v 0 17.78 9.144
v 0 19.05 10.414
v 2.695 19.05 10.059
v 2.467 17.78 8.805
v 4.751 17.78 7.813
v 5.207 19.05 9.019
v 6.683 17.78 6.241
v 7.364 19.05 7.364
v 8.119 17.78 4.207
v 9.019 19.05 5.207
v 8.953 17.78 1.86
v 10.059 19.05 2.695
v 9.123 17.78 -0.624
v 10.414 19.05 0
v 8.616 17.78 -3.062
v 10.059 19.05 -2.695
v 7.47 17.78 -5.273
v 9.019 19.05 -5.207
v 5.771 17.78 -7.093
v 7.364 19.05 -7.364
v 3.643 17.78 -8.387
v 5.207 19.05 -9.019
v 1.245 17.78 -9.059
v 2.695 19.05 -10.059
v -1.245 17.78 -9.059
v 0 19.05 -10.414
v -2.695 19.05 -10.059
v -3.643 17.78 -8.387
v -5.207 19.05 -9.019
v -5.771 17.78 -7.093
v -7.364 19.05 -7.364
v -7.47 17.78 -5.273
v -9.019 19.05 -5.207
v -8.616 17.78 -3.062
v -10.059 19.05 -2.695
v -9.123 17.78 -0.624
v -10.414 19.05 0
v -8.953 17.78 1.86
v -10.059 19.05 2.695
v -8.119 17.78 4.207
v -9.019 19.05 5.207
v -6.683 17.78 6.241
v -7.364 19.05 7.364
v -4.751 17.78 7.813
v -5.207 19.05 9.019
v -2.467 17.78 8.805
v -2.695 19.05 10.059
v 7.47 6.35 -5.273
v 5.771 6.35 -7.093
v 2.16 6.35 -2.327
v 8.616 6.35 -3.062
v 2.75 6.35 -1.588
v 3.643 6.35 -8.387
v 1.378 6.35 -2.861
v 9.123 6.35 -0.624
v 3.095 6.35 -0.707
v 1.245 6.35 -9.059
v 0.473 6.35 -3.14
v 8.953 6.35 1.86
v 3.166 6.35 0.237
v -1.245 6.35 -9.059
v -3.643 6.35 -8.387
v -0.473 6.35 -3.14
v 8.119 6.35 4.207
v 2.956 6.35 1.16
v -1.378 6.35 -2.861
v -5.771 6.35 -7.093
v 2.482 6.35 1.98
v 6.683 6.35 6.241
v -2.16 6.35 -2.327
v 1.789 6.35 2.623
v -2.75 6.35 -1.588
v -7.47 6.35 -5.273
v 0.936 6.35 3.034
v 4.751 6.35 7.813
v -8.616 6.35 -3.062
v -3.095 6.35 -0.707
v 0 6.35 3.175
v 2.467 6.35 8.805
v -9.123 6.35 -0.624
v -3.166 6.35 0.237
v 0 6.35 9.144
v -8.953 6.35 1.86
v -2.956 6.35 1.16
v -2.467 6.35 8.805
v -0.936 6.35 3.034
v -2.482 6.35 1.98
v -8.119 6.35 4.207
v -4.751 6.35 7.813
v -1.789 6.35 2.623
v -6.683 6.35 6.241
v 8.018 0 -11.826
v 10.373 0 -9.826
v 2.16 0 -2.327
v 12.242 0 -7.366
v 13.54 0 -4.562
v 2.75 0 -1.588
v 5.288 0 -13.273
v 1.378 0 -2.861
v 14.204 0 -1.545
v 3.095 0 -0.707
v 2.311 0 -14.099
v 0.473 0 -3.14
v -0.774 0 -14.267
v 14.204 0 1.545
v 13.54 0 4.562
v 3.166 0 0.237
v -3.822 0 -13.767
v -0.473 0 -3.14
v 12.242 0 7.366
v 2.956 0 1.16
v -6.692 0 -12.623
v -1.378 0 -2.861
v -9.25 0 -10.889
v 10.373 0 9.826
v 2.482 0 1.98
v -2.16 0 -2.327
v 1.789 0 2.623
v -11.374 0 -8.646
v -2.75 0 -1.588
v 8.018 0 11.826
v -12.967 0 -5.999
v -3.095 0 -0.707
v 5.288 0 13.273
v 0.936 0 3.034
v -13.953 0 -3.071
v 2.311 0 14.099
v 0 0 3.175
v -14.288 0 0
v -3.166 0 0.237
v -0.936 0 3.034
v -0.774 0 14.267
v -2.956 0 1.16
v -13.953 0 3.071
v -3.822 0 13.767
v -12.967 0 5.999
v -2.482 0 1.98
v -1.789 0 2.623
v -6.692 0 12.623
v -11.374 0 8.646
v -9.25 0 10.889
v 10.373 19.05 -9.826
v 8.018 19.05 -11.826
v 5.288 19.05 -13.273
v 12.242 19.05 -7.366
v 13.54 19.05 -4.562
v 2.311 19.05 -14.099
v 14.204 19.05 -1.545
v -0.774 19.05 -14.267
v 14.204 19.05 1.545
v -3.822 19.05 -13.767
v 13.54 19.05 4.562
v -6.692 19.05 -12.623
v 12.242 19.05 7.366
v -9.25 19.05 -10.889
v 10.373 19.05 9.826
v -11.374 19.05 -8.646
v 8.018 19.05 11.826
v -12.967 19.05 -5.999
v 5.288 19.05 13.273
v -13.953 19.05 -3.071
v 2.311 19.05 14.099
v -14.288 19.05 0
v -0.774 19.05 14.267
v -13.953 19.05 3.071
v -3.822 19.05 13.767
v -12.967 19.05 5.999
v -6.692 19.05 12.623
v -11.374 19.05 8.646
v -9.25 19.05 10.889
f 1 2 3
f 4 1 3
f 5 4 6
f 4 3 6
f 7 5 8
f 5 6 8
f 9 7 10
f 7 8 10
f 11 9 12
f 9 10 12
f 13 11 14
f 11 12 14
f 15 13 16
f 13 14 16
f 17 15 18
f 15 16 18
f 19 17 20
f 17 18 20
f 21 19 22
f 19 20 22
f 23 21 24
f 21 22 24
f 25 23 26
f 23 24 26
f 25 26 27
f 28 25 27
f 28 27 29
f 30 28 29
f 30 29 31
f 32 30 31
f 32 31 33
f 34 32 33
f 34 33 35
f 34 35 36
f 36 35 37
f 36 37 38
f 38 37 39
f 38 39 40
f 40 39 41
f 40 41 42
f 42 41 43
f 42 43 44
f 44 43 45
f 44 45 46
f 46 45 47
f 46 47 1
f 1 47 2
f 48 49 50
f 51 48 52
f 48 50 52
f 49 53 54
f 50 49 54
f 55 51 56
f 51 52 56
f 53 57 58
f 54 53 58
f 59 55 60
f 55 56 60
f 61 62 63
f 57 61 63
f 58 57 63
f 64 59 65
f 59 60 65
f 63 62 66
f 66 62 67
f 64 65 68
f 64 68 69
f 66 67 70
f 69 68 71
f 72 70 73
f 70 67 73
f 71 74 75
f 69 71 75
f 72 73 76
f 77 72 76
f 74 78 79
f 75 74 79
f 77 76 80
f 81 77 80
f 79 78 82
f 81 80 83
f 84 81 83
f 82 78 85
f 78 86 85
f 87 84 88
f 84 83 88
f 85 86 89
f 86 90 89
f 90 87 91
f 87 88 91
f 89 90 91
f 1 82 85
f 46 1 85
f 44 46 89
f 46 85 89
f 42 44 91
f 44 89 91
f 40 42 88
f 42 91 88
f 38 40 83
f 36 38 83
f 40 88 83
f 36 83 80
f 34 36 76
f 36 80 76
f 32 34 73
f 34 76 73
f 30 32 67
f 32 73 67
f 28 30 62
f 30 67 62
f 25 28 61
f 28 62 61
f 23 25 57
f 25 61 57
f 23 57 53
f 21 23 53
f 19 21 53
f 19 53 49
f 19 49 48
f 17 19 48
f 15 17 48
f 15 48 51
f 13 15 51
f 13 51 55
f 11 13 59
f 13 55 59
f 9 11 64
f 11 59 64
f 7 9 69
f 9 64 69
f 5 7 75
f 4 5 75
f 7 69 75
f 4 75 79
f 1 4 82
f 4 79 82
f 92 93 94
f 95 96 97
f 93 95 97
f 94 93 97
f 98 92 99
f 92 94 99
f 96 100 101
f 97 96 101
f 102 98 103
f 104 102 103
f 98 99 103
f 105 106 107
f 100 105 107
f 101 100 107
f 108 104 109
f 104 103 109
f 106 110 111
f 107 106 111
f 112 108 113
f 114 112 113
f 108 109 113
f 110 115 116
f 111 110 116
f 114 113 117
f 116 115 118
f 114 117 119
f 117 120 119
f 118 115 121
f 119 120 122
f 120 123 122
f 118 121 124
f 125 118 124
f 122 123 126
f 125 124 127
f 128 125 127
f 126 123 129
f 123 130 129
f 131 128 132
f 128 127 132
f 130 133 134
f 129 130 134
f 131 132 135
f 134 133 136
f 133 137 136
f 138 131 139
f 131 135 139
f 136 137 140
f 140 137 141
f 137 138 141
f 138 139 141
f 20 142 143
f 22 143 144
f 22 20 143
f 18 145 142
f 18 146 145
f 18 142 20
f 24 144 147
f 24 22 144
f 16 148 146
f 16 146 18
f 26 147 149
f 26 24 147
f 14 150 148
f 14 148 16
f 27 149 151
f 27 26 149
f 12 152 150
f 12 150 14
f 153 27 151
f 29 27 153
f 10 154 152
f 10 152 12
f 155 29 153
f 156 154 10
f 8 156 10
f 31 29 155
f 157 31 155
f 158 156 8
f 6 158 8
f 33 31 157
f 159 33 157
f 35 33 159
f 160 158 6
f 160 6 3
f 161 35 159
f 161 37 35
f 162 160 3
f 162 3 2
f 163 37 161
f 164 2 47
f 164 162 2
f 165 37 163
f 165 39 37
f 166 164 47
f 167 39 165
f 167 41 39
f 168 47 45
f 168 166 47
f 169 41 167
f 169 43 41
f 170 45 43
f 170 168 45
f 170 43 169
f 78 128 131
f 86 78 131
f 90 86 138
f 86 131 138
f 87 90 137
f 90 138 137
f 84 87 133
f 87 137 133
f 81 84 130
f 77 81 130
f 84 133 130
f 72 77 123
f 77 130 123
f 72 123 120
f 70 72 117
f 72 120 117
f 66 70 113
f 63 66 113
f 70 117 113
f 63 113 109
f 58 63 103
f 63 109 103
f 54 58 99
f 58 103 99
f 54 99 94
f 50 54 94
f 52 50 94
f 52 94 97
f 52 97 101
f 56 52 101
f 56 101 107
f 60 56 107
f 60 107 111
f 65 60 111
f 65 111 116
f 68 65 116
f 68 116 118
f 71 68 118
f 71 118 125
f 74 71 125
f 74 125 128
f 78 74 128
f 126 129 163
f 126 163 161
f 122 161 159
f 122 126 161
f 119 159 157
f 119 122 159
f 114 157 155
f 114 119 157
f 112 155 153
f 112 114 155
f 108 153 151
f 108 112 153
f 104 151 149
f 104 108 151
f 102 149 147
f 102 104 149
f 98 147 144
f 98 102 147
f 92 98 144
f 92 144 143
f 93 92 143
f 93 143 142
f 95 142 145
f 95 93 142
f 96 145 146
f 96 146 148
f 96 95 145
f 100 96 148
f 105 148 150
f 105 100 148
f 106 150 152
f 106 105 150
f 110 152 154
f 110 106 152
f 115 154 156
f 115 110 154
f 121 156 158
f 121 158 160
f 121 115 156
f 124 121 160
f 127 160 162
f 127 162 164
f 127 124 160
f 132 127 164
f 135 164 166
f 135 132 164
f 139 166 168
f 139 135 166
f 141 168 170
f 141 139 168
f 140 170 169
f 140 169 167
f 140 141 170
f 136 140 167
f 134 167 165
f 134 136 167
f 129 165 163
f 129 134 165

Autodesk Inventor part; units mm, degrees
ref_plane "YZ Plane" through (0, 0, 0) normal (1, 0, 0) x (0, 1, 0)
ref_plane "XZ Plane" through (0, 0, 0) normal (0, 1, 0) x (-1, 0, 0)
ref_plane "XY Plane" through (0, 0, 0) normal (0, 0, 1) x (1, 0, 0)
sketch "Sketch1" plane through (0, 0, 0) normal (0, 1, 0) x (-1, 0, 0)
  line L0 (0, -20.0025) -> (0, 20.0025) projected
  line L1 (-20.0025, 0) -> (20.0025, 0) projected
  circle A0 centre (0, 0) radius 14.2875
  dimension "d0" = 28.575
extrude "Extrusion1" add sketch "Sketch1" along normal blind 19.05
sketch "Sketch2" plane through (0, 19.05, 0) normal (0, 1, 0) x (1, 0, 0)
  line L0 (0, 20.0025) -> (0, -20.0025) projected
  line L1 (20.0025, 0) -> (-20.0025, 0) projected
  point P0 (0, 0)
sketch "Sketch3" plane through (0, 19.05, 0) normal (0, 1, 0) x (1, 0, 0)
  point P0 (0, 0)
hole "Hole1" at (0, 19.05, 0) direction (0, -1, 0) diameter 6.35 end through all counterbore diameter 18.288 counterbore depth 12.7
chamfer "Chamfer1" distance 1.27 angle 45 1 edges at (0, 19.05, -9.144)
properties material "ABS, BEIGE"
